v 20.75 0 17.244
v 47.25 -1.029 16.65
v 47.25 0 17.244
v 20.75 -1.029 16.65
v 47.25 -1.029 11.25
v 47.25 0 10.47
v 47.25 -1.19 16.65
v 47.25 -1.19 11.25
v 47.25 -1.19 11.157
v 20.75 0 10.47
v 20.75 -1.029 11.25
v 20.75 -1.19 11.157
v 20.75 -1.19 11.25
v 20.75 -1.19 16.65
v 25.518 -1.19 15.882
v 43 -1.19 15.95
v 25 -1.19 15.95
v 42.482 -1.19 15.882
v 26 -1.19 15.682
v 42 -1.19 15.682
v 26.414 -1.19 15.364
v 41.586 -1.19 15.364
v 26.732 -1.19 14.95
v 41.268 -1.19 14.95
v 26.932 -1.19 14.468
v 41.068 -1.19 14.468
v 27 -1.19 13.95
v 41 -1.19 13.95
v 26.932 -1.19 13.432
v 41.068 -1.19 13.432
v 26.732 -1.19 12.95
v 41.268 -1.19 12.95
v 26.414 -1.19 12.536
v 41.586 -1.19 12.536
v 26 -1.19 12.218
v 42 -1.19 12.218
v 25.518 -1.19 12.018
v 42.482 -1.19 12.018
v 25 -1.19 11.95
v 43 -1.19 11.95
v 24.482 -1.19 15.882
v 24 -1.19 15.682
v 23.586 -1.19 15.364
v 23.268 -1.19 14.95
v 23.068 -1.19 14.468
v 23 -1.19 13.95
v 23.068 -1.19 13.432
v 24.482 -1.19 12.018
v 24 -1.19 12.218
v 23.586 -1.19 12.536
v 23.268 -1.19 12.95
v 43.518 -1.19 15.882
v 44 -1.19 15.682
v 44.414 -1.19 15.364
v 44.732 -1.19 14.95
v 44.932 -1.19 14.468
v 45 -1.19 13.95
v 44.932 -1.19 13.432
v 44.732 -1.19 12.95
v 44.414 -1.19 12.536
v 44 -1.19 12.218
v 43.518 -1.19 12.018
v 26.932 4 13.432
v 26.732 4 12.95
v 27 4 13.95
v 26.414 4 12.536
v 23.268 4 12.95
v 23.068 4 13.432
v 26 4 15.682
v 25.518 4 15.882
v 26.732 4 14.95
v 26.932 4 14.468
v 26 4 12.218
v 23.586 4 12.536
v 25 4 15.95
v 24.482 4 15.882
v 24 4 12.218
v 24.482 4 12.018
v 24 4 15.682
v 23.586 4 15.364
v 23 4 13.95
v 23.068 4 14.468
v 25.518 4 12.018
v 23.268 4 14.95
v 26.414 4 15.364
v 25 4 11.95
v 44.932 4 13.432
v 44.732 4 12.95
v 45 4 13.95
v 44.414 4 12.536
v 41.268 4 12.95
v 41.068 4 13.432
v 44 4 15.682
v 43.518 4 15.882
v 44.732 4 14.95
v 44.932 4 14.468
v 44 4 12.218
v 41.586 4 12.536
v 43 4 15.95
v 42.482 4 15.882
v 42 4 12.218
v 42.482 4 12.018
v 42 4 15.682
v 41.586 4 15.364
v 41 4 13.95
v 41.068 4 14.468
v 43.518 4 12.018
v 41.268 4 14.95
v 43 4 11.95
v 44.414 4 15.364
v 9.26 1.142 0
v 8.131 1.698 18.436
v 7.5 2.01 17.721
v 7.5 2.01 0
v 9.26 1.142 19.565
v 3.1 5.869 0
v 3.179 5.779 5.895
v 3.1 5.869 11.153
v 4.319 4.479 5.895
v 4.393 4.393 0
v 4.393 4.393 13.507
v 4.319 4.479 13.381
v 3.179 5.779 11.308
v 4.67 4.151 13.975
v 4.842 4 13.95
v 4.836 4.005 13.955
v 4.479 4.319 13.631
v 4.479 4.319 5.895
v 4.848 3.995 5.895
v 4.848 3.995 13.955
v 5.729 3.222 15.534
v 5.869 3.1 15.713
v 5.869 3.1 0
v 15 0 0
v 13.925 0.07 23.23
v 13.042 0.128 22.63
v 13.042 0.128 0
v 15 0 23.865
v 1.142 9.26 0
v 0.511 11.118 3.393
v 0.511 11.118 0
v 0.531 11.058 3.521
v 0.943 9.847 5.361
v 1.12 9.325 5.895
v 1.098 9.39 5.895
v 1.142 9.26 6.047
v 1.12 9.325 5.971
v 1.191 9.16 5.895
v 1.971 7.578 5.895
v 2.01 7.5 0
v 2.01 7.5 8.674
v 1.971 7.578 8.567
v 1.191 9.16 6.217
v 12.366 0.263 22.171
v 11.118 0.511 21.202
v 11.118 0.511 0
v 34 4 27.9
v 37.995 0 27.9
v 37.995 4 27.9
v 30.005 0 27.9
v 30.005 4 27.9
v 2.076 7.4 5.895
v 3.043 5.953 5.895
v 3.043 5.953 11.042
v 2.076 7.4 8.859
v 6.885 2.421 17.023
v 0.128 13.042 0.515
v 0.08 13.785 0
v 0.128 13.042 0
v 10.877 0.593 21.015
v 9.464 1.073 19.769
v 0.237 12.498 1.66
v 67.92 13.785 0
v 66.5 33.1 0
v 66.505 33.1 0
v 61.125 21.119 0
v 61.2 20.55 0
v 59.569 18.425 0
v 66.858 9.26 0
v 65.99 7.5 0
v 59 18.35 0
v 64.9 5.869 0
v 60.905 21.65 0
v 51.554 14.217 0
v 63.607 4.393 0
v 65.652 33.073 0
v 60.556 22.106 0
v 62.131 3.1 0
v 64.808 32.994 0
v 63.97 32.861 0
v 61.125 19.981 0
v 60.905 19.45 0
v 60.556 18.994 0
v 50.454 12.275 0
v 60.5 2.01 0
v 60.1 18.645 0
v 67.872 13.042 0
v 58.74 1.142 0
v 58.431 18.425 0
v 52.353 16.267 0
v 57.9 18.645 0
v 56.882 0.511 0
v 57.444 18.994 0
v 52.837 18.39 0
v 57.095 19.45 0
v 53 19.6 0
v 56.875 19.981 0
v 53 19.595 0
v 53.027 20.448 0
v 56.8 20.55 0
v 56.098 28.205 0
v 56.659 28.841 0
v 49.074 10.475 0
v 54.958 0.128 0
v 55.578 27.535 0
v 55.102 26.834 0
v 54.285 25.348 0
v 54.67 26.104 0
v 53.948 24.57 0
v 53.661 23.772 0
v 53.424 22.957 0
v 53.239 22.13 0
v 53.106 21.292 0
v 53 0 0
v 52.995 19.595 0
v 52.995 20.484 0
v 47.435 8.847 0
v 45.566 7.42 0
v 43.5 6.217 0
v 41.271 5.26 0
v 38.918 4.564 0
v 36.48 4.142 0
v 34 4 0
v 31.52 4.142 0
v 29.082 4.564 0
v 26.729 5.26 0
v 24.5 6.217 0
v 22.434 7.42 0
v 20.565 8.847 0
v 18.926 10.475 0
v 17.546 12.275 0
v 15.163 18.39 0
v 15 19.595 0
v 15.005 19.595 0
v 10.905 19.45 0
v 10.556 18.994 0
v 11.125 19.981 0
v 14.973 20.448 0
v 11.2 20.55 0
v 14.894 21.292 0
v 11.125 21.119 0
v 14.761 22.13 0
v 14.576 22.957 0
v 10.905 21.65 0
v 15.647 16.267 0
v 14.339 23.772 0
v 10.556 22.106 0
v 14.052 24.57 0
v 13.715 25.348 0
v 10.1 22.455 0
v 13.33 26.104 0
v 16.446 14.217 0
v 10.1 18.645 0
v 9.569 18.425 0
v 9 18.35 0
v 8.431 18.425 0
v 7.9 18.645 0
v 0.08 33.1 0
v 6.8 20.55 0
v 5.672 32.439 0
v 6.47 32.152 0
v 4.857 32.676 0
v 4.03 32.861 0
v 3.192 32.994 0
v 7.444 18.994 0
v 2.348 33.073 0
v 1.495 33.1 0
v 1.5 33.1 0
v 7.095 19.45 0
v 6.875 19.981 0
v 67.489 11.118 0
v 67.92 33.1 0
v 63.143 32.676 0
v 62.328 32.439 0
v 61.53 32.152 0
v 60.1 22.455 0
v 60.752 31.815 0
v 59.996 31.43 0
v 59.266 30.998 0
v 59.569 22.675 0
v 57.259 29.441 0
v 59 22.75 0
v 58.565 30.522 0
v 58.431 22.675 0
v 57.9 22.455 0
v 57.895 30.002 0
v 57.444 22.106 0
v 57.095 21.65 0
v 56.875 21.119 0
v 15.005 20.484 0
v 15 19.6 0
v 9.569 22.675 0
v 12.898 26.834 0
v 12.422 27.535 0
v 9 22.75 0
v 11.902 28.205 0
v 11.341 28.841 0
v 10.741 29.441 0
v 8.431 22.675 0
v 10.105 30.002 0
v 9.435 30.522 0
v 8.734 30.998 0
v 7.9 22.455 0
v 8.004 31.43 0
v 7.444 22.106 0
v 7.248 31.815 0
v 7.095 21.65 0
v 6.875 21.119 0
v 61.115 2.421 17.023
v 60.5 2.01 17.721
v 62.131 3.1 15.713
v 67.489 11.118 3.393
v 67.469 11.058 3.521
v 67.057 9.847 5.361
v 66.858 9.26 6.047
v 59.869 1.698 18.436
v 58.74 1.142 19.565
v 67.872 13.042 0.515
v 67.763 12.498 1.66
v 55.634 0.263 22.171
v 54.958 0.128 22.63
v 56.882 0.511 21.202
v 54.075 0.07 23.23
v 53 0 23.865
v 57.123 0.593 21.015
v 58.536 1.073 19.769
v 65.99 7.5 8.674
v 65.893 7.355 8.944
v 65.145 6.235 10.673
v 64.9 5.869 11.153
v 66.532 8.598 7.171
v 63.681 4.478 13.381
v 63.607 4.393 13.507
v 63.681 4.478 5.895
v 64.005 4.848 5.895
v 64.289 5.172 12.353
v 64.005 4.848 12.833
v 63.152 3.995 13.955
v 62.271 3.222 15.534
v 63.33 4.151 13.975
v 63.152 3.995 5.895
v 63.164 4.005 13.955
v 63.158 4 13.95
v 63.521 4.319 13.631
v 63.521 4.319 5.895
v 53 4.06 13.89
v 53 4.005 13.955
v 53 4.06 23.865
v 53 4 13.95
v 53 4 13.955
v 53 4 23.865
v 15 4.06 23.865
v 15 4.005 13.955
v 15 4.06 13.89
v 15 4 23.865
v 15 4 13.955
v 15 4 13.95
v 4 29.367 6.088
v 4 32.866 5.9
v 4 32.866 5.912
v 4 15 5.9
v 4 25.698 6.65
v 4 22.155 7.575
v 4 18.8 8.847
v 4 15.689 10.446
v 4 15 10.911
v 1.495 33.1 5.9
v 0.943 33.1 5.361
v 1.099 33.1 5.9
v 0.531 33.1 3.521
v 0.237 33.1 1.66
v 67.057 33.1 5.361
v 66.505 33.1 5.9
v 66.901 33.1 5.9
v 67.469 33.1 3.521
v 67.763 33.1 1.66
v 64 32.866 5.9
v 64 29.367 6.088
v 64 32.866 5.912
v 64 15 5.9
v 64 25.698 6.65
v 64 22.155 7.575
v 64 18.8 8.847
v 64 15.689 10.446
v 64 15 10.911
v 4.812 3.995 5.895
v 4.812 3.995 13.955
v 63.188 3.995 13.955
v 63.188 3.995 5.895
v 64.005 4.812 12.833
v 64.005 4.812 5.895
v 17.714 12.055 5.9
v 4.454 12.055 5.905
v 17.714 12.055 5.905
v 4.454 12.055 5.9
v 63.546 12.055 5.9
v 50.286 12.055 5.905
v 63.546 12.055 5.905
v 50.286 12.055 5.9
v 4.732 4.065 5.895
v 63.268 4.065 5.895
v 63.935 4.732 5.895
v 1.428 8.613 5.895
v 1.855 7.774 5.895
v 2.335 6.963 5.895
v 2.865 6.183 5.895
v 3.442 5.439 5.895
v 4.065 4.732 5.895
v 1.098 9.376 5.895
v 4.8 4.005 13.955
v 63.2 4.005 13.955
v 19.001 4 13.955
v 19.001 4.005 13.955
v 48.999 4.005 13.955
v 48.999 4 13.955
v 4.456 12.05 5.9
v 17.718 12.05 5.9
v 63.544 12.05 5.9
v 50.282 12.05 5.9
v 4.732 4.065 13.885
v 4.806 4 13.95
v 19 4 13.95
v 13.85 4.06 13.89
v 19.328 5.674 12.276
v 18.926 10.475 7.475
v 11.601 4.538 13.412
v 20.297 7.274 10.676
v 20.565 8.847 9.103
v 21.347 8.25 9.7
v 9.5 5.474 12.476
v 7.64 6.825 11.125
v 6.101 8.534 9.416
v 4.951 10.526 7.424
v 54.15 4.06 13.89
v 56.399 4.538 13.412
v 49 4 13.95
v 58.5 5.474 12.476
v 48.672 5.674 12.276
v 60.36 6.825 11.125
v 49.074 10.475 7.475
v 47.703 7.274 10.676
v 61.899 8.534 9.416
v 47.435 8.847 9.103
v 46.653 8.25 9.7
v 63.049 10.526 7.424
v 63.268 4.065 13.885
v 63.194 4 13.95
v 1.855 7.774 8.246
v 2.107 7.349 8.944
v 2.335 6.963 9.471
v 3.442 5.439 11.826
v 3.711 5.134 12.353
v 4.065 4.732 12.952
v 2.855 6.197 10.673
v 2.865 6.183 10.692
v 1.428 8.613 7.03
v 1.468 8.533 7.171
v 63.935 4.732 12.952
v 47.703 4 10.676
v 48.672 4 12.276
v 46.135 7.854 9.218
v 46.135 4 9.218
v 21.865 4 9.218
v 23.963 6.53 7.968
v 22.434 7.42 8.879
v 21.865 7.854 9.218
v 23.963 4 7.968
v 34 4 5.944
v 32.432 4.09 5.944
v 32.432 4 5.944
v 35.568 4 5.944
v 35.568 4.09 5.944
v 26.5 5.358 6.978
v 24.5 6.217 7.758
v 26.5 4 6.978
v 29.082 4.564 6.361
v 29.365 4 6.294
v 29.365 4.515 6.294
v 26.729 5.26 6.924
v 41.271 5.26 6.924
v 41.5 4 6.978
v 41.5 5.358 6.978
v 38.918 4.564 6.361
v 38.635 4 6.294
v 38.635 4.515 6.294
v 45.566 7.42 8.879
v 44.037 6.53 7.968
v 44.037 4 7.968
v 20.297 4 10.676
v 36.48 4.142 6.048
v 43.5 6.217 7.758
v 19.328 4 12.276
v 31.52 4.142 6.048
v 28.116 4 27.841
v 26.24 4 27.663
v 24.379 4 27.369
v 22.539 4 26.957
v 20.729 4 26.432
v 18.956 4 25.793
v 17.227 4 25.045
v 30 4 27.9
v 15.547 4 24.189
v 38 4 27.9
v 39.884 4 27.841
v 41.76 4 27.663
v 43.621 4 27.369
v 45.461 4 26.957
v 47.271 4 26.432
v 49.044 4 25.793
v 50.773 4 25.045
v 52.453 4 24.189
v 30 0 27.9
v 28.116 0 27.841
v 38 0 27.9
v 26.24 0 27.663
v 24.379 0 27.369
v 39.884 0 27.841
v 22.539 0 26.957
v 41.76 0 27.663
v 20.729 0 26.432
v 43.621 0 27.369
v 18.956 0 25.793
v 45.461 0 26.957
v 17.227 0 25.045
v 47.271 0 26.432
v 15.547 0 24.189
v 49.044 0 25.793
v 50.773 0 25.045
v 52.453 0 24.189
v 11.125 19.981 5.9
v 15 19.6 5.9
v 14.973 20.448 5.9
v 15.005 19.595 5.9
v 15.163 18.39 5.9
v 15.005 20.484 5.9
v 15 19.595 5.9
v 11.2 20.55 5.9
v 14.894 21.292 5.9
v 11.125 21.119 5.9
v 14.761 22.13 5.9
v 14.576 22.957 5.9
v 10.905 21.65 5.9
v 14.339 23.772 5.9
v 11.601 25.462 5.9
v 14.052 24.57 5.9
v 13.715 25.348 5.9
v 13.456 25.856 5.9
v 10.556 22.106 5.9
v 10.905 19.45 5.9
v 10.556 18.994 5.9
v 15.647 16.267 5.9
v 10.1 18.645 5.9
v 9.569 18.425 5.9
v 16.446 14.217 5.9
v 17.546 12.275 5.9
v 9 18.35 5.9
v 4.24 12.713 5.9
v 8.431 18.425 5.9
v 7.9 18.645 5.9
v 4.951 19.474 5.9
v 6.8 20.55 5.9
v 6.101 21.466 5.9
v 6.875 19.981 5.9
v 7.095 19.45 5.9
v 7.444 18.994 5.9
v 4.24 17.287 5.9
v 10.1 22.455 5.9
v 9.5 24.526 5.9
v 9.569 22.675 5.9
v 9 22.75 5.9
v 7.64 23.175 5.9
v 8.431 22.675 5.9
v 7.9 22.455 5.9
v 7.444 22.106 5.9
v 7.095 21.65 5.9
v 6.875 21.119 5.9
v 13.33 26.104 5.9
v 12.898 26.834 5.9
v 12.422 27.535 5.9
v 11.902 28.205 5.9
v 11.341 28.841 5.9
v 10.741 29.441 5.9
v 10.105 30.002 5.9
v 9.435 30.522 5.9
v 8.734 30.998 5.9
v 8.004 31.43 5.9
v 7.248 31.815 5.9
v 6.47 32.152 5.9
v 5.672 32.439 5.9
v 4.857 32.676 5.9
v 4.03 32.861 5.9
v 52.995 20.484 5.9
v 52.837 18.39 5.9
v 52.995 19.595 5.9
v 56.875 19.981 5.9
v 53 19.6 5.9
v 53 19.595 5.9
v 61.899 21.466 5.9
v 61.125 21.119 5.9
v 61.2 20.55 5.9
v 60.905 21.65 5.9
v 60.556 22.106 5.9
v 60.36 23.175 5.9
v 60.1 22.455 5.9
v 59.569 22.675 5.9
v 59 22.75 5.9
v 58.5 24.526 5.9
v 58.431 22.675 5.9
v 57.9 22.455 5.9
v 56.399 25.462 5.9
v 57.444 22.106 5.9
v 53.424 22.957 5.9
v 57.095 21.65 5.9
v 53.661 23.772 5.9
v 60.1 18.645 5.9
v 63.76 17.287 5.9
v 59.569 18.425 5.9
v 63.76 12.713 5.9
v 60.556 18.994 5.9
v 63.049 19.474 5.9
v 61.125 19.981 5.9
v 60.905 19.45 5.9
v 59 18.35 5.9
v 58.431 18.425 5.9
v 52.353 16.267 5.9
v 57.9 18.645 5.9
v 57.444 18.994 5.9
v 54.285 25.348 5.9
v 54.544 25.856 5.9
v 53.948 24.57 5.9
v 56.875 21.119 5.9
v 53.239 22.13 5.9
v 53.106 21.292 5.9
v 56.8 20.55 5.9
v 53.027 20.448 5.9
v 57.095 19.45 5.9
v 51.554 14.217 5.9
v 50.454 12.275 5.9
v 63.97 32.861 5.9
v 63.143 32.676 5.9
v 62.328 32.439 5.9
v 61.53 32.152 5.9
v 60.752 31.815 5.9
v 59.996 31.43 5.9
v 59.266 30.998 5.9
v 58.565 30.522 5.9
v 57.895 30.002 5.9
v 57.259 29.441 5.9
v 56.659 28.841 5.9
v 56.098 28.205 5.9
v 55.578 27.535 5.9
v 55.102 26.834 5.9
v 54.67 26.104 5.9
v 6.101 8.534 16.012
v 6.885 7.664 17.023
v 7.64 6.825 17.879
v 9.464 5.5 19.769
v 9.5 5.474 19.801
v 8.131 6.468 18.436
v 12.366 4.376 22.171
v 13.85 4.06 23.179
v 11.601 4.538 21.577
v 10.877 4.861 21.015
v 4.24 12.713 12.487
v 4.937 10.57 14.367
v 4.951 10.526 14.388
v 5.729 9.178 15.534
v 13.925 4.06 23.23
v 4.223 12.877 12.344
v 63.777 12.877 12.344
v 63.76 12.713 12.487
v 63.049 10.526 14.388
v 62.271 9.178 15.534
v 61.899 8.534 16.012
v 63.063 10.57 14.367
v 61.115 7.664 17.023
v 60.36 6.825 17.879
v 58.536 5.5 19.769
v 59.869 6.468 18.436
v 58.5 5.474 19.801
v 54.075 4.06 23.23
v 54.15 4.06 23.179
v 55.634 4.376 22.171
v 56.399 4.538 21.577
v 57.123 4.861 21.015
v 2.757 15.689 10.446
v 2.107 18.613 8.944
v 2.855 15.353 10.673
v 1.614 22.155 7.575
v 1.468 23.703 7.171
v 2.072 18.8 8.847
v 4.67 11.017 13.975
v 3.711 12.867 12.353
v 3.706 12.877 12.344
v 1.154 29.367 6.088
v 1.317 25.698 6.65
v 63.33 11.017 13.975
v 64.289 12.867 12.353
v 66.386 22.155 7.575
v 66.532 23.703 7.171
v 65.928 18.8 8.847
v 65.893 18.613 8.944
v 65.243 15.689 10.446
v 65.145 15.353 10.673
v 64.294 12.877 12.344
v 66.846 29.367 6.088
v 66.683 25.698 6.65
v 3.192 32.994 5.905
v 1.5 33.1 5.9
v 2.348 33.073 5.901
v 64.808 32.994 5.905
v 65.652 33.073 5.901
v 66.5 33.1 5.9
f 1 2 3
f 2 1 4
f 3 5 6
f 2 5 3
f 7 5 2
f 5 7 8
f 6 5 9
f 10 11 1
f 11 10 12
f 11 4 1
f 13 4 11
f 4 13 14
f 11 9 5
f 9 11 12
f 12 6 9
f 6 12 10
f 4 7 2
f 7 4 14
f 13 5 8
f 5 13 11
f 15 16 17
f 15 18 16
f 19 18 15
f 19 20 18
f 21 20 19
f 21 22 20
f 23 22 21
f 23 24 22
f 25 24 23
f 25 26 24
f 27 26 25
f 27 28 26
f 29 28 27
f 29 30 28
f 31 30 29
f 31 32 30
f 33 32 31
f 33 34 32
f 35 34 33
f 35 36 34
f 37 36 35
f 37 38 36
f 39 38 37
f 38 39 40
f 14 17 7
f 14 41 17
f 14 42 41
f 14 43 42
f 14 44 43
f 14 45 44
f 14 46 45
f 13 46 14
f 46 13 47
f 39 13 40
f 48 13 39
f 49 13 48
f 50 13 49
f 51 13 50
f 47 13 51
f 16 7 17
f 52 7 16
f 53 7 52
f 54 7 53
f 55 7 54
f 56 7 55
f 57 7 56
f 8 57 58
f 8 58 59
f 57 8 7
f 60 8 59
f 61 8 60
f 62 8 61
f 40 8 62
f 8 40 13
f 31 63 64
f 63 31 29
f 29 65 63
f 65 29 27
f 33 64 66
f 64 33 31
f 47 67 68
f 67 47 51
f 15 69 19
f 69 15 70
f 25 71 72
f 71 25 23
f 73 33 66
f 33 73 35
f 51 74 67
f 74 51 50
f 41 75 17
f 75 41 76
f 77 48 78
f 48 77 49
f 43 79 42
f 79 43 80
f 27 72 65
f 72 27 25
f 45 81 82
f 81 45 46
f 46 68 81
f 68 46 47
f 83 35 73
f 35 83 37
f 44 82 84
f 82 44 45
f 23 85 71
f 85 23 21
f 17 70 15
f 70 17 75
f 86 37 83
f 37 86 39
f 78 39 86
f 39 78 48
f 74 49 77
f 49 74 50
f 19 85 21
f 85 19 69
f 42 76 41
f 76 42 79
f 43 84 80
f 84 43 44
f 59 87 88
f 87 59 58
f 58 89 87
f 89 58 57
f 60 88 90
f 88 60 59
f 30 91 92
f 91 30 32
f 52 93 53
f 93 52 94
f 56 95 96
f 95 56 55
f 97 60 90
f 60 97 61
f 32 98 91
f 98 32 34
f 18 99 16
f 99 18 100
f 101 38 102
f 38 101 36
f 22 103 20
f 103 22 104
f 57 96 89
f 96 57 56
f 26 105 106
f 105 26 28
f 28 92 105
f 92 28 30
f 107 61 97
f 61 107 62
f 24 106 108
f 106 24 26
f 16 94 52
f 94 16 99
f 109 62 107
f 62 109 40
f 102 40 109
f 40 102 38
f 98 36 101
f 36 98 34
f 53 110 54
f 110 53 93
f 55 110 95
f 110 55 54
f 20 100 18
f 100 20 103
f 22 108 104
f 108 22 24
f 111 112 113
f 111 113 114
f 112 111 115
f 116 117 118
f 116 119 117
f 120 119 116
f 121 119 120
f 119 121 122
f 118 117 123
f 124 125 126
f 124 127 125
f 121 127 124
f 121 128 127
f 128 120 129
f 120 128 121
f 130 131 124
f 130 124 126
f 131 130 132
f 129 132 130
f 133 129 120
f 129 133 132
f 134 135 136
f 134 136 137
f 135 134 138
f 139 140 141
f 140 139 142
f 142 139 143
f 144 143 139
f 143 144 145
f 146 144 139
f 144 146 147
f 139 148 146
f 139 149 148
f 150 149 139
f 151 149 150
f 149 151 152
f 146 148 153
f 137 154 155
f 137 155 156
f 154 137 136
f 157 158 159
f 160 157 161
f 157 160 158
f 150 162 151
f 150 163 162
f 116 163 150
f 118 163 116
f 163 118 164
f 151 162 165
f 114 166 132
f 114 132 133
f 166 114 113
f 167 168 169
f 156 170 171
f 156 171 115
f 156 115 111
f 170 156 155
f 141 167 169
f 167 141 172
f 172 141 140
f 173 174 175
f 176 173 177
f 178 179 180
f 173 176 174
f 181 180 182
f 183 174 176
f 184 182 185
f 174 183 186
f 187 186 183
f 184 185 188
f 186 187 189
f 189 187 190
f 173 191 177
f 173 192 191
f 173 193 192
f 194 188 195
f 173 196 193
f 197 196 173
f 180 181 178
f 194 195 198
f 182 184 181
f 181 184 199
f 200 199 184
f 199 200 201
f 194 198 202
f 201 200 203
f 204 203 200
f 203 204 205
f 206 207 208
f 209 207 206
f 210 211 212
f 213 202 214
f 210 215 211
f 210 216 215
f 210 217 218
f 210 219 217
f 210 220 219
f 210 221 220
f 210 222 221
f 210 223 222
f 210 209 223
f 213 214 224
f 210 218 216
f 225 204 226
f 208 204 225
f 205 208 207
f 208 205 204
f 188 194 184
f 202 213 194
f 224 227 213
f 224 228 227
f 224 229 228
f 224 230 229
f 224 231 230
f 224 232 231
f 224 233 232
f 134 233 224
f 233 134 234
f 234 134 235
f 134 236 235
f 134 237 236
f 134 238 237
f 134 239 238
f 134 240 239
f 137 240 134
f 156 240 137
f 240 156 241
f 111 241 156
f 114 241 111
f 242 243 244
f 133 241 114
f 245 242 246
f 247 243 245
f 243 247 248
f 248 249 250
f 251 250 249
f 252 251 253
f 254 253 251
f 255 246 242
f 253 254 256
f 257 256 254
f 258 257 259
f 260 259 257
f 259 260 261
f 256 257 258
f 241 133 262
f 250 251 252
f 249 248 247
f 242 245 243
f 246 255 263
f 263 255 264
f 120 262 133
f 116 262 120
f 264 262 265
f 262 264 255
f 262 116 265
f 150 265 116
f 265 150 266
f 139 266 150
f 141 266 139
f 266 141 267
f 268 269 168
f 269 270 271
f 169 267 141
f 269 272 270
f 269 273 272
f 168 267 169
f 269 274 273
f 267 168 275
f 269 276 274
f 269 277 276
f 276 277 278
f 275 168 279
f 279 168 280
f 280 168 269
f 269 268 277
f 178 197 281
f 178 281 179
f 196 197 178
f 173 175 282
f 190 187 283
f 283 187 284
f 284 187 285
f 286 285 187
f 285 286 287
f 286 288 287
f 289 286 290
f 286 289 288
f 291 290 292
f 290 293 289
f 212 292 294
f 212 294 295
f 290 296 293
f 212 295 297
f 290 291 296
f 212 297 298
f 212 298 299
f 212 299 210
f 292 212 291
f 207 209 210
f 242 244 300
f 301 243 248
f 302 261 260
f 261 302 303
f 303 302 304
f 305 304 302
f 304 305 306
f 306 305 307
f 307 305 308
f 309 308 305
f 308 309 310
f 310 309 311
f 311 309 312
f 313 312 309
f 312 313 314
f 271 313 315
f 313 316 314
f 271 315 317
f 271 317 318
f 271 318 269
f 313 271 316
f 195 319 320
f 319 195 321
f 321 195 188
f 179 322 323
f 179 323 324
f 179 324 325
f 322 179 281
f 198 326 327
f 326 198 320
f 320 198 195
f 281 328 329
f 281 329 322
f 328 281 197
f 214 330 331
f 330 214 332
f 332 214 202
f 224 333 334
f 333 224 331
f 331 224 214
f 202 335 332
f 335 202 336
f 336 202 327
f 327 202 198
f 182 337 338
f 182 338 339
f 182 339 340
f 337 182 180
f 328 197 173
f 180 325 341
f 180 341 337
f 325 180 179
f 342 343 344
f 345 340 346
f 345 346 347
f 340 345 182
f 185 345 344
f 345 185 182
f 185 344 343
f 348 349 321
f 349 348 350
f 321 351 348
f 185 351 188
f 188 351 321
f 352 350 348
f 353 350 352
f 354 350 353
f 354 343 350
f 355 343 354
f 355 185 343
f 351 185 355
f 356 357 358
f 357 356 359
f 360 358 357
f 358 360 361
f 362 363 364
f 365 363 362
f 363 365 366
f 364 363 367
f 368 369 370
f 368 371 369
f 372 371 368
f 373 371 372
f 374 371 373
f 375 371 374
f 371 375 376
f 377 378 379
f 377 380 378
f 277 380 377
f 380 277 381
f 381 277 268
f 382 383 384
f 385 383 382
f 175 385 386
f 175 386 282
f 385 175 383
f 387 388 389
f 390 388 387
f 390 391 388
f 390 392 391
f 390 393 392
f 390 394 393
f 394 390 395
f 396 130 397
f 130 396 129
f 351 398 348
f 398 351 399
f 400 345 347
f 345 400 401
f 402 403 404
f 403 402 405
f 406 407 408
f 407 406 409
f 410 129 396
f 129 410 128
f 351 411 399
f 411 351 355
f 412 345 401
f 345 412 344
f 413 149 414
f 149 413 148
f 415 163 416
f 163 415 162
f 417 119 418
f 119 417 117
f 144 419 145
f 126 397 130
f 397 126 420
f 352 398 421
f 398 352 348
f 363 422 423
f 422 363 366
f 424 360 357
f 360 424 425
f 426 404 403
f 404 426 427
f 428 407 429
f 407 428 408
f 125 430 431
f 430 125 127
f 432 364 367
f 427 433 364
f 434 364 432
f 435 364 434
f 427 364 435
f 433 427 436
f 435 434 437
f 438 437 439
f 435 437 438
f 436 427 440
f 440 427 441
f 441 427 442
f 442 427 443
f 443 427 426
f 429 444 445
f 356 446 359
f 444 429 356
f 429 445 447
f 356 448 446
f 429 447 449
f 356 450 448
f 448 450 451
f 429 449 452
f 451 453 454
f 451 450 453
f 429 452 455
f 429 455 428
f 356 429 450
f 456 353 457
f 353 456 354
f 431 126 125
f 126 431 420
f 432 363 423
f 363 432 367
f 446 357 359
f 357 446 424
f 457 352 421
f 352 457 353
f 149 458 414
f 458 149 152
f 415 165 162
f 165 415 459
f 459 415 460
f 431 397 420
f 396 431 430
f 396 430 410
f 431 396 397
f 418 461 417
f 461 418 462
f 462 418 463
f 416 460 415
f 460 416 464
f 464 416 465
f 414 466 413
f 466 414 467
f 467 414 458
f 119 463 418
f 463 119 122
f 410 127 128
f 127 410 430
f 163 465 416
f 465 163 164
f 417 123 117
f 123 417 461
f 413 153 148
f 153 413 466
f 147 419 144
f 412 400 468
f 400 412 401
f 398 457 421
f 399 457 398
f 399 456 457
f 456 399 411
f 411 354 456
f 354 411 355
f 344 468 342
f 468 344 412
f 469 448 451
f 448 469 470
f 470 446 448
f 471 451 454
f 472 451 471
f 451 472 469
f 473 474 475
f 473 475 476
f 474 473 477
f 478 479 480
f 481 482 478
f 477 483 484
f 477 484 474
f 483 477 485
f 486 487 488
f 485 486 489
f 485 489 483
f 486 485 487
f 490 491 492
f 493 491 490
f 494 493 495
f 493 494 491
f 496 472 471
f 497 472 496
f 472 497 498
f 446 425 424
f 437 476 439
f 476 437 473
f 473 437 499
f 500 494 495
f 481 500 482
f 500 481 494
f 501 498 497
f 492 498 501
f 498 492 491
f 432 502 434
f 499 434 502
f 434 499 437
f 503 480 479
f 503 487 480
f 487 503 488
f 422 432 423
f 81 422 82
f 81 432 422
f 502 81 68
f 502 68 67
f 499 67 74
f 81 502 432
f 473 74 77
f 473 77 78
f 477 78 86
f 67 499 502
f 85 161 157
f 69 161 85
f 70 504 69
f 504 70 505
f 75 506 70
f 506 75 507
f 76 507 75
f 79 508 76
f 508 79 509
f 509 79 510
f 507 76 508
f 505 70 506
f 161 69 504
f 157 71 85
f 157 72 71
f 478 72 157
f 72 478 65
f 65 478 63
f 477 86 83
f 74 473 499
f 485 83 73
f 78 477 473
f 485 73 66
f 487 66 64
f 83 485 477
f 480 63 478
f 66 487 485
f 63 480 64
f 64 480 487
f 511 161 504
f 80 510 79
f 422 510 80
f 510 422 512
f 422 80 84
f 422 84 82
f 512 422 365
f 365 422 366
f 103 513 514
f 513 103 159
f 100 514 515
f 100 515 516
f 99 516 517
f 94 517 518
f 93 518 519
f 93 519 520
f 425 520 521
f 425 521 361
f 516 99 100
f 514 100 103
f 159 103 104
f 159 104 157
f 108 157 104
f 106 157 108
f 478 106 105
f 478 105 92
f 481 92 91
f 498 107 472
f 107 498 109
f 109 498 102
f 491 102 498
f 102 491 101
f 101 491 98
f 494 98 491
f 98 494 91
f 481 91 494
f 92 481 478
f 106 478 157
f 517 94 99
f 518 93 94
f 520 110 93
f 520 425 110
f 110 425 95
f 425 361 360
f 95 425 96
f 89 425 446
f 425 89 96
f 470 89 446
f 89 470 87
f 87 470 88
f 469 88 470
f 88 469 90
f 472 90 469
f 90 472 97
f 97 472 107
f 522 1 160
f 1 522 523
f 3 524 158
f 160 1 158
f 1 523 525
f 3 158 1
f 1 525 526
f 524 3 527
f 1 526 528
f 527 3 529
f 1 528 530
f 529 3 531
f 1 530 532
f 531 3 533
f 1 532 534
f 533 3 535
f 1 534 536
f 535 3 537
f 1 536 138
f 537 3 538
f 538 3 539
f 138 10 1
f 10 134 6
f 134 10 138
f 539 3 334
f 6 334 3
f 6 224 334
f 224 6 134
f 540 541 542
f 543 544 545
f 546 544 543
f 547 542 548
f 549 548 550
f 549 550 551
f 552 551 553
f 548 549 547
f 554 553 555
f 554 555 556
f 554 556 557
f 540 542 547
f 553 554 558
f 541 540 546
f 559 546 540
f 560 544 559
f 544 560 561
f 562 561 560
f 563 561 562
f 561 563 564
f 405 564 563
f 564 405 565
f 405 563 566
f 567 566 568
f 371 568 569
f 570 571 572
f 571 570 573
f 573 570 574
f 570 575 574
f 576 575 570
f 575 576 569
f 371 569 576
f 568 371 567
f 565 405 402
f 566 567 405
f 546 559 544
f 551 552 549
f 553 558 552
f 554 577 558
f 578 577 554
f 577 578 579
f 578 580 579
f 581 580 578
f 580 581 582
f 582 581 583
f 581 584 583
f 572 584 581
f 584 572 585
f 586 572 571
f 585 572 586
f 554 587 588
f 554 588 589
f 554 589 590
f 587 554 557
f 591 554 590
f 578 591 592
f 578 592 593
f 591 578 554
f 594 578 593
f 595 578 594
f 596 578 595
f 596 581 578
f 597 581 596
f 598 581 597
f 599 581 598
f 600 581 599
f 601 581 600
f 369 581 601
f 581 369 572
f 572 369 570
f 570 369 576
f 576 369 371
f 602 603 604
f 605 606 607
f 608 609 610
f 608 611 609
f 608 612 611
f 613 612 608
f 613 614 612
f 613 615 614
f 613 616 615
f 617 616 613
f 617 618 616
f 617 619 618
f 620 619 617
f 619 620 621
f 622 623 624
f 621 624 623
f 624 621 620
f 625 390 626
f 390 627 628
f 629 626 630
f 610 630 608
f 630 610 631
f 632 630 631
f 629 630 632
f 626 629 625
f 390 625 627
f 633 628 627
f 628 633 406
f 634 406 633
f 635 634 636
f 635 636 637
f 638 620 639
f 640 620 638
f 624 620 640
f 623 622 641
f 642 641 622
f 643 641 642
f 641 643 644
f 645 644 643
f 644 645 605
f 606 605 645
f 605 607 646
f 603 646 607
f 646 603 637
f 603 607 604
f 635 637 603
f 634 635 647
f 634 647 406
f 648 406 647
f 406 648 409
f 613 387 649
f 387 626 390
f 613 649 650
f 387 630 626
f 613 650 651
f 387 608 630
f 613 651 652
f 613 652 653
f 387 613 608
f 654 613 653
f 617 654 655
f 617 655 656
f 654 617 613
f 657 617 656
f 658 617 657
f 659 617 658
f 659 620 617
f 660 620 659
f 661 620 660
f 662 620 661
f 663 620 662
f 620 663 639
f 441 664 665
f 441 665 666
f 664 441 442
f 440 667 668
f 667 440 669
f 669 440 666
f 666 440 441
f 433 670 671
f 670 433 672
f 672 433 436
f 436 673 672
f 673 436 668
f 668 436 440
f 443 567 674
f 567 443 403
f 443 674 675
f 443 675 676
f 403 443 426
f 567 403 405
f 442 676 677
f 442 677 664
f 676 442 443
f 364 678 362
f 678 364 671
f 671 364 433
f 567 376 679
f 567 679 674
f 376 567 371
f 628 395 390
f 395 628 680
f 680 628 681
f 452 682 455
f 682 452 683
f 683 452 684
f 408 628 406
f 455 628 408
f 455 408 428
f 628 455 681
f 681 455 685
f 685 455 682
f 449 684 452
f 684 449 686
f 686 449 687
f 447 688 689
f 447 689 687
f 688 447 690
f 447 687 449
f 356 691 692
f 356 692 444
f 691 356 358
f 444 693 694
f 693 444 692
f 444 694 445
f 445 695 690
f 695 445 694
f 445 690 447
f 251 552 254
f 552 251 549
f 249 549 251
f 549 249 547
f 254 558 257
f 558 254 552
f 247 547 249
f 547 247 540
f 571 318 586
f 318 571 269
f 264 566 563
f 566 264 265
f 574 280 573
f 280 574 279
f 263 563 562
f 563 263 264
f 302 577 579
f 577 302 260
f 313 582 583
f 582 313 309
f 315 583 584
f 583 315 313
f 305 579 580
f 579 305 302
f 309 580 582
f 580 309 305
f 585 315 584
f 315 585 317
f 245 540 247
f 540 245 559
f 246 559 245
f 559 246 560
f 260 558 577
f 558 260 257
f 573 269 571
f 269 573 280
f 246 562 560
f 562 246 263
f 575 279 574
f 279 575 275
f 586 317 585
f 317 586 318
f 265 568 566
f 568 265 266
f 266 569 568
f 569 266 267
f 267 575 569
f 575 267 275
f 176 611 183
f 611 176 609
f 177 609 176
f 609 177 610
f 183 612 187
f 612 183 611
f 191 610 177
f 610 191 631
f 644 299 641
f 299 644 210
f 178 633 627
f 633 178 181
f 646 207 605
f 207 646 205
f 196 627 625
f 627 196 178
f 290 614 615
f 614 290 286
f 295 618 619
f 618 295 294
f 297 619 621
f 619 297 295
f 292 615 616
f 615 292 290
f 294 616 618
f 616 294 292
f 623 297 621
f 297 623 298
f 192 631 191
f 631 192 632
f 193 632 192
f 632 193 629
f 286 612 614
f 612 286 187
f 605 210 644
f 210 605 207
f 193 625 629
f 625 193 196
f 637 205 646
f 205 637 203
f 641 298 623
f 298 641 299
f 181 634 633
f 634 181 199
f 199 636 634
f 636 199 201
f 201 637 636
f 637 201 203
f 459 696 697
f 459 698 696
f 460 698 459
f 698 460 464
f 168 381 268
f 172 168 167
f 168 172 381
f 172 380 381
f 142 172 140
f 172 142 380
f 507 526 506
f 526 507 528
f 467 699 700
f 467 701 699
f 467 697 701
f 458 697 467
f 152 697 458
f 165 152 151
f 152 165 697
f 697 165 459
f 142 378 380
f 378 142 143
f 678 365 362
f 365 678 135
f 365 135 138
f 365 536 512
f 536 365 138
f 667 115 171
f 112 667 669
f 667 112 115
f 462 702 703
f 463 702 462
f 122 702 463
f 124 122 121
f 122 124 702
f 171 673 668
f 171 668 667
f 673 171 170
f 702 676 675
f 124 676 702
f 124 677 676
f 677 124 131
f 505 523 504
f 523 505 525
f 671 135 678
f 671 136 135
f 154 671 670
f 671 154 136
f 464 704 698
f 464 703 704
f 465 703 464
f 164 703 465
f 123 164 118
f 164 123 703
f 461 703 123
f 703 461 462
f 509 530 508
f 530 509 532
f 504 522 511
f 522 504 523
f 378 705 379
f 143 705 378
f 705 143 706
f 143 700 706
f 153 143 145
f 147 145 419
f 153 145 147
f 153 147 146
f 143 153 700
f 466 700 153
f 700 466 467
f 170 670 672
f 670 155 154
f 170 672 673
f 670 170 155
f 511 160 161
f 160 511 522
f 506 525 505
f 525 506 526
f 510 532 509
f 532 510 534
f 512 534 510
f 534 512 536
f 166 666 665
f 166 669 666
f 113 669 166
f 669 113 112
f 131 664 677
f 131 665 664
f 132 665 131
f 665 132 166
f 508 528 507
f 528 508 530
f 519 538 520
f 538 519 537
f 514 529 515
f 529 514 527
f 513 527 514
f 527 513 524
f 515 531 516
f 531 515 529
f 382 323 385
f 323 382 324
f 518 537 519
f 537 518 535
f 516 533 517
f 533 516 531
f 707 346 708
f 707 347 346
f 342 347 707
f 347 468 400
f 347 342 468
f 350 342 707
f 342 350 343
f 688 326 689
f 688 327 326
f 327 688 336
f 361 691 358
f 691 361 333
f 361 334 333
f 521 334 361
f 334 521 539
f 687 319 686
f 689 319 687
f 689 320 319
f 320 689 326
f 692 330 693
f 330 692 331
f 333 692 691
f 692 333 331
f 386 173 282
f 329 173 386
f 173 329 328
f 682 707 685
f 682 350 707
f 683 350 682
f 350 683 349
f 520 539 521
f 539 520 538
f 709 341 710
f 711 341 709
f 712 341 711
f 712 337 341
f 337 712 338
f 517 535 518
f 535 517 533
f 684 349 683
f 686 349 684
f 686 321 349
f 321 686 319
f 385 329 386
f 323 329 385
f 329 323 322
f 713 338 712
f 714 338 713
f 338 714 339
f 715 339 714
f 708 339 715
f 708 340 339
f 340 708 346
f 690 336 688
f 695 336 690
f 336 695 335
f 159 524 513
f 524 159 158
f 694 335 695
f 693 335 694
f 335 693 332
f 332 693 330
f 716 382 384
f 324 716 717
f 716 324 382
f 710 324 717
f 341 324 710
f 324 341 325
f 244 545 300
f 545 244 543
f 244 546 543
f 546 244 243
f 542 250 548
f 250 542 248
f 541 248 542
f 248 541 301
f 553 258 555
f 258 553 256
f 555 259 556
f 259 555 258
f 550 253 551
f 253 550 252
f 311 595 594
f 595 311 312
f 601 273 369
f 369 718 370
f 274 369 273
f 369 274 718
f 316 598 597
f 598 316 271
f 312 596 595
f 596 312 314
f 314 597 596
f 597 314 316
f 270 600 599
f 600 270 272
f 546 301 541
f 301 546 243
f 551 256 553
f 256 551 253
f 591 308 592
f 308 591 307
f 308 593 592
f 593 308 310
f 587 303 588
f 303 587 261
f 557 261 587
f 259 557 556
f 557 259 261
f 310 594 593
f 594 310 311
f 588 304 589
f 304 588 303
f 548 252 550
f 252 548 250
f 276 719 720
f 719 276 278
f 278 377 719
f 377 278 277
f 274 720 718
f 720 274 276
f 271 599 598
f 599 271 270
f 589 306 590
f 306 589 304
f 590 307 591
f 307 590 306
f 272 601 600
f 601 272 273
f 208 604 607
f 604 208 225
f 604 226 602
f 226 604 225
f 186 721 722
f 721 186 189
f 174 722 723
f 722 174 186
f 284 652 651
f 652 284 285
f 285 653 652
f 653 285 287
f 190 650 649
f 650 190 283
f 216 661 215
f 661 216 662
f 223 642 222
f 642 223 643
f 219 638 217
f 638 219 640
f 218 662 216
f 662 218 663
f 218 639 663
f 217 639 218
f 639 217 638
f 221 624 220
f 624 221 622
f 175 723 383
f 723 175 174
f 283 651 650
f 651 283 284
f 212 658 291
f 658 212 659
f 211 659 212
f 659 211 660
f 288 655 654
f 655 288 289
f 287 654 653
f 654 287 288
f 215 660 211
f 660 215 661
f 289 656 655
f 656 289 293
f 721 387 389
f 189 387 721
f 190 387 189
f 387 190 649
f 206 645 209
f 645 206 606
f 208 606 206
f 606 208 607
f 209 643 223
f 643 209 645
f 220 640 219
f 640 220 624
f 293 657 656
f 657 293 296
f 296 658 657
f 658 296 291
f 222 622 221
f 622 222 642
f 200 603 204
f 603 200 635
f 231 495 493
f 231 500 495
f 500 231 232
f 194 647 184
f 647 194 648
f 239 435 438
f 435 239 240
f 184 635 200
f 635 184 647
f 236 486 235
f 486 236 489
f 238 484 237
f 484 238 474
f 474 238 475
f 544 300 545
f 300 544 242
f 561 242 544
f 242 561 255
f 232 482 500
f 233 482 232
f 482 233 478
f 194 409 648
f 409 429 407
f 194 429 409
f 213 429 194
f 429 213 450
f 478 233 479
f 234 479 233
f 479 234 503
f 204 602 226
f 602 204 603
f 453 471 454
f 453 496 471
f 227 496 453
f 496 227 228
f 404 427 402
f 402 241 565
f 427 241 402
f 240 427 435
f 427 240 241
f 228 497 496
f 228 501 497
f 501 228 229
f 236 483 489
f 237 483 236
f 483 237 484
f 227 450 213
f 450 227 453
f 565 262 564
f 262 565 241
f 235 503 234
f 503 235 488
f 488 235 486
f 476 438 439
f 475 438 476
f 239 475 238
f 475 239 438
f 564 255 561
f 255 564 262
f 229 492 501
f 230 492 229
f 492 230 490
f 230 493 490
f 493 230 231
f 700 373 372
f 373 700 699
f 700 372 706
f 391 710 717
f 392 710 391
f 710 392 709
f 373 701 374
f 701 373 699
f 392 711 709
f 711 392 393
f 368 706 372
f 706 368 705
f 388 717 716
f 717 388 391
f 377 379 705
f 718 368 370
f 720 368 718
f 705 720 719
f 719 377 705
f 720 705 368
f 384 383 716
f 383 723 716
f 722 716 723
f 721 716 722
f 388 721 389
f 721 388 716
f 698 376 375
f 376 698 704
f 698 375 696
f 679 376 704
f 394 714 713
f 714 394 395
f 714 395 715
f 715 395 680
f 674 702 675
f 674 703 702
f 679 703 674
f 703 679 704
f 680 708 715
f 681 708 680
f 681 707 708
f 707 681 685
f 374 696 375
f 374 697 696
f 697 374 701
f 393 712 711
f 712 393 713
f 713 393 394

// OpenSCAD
// file: roundEdges.scad
/*
 *  Copyright (C) 2012  Krallinger Sebastian
 *
 *  This program is free software; you can redistribute it and/or modify
 *  it under the terms of the GNU General Public License as published by
 *  the Free Software Foundation; either version 3 of the License,
 *  LGPL version 2.1, or (at your option) any later version of the GPL.
 *
 *  This program is distributed in the hope that it will be useful,
 *  but WITHOUT ANY WARRANTY; without even the implied warranty of
 *  MERCHANTABILITY or FITNESS FOR A PARTICULAR PURPOSE.  See the
 *  GNU General Public License for more details.
 *
 *  You should have received a copy of the GNU General Public License
 *  along with this program; if not, write to the Free Software
 *  Foundation, Inc., 59 Temple Place, Suite 330, Boston, MA 02111-1307 USA
 *
*/


//Rounded Edges
module roundEdge(_a=0,_r=1,_l=1,_fn=100){
	rotate (a=[0,0,_a]){
		translate(v=[_r,_r,0]){
			rotate (a=[0,0,0]) rotate (a=[0,0,180]){
				difference() {
					translate (v=[-OS/2,-OS/2,-OS/2])
						cube (size = [_r+OS,_r+OS,_l+OS],center=false );
					translate (v=[0,0,-OS*2/2])
						cylinder (h = _l+OS*2, r=_r, center = false, $fn=_fn);
				}
			}
		}
	}
}
//roundEdge(_a=0,_l=10);
// file: teardrop.scad
module teardrop (r=4.5,h=20,top_and_bottom=false)
{
	rotate([-270,0,90])
	linear_extrude(height=h,convexity=10)
	{
		circle(r=r);
		polygon(points=[[0,0],[r*cos(30),r*sin(30)],[0.5*r,r],[-0.5*r,r],[-r*cos(30),r*sin(30)]],
				paths=[[0,1,2,3,4]]);
		if (top_and_bottom)
		polygon(points=[[0,0],[r*cos(30),-r*sin(30)],[0.5*r,-r],[-0.5*r,-r],[-r*cos(30),-r*sin(30)]],
				paths=[[0,1,2,3,4]]);
		
	}
}

module teardropcentering (r=4.5,h=20)
{
	rotate([-270,0,90])
	linear_extrude(height=h)
	{
		circle(r=r, $fn = 24);
		polygon(points=[[0,0],[r*cos(30),r*sin(30)],[0.5*r,1.2*r],[-0.5*r,1.2*r],[-r*cos(30),r*sin(30)]],
				paths=[[0,1,2,3,4]]);
	}
}

module teardropcentering2 (r=4.5,h=20)
{
	//rotate([-270,0,90])
	difference(){
	linear_extrude(height=h)
	{
		circle(r=r, $fn = 24);
		polygon(points=[[0,0],[r*cos(30),r*sin(30)],[0.5*r,1.2*r],[-0.5*r,1.2*r],[-r*cos(30),r*sin(30)]],
				paths=[[0,1,2,3,4]]);
	}
	translate(v = [-1.5*r, -1.5*r,-1])cube(size =[3*r,1.5*r,h+2]);
	}
}
// file: units.scad
/*
 * Basic units.
 * 
 * Originally by Hans Häggström, 2010.
 * Dual licenced under Creative Commons Attribution-Share Alike 3.0 and LGPL2 or later
 */


mm = 1;
cm = 10 * mm;
dm = 100 * mm;
m = 1000 * mm;

inch = 25.4 * mm;

X = [1, 0, 0];
Y = [0, 1, 0];
Z = [0, 0, 1];

M3 = 3*mm;
M4 = 4*mm;
M5 = 5*mm;
M6 = 6*mm;
M8 = 8*mm;


// When a small distance is needed to overlap shapes for boolean cutting, etc.
epsilon = 0.01*mm;
OS = epsilon;  // Over size
// main file
/* H-Xtruder-Mount [Xm]
 * Copyright (c) 2012 by Krallinger Sebastian [s.krallinger+cc@gmail.com]
 * 
 * Creative Commons Attribution-ShareAlike 3.0 (CC BY-SA) [http://creativecommons.org/licenses/by-sa/3.0/]
 * original desing by abdrumm for the PrintrBot
 */

include <units.scad>
include <teardrop.scad>
include <roundEdges.scad>


/*------------------------------------general---------------------------------*/
Xm_mode = "print";  // can be print or inspect [overlays the model with the original model] (uncomment next line)
Xm_mode = "inspect";

Xm_outline           = [68, 33.1, 27.9];   // absolute Xm_outline [x,y,z]


Xm_extM_tabelThickness = 5.9;

Xm_extM_genWallThickness = 4;

Xm_ext_hole_diam = 4.4;
Xm_ext_hole_xoff = 50/2;
Xm_ext_hole_yoff = 20.55;

Xm_Zdir_edge_r = 15;

Xm_carr_hole_zoff = Xm_outline[2]/2;
Xm_carr_hole_xoff = 18/2;
Xm_carr_hole_dia = 4;

Xm_tchOuterWidth     = 7.3;
Xm_notchInnerWidth   = 5.4;
Xm_notchDepth        = 1.2;
Xm_notchLength       = 24 + 2.5;



module H_Xtruder_mount() {
	ext_cutout_r = Xm_ext_hole_yoff- Xm_extM_genWallThickness;
	ext_cutout_scal = (Xm_ext_hole_xoff-Xm_extM_genWallThickness*1.5)/ext_cutout_r;
	extM_remainingPeeksXdir = (Xm_outline[0]-ext_cutout_r*ext_cutout_scal*2)/2;

	// notch
	difference() {
		union(){		
			translate([Xm_outline[0]/2, -Xm_notchDepth/2 + OS, Xm_carr_hole_zoff])
				cube(size=[Xm_notchLength, Xm_notchDepth, Xm_notchInnerWidth], center=true);
			
			for (i=[1,-1]) 
			translate([Xm_outline[0]/2,  + OS, Xm_carr_hole_zoff+i*Xm_notchInnerWidth/2+Xm_notchDepth/2])
			rotate(a=-30,v=X) rotate(a=90,v=Y) 
				triangle(l=Xm_notchDepth,h=Xm_notchLength);
		}
		union(){
			// carr holes
			for (i=[-1,1]) 
			translate([Xm_outline[0]/2+i*Xm_carr_hole_xoff, -OS- Xm_notchDepth, Xm_carr_hole_zoff])
			rotate(a=-90,v=X) 
				cylinder(r=Xm_carr_hole_dia/2, h=Xm_extM_genWallThickness+2*OS, center=false,$fn=24); 
		}
	}
	

                                                                                                                                                                                                                                                                                                                                                                                                                                                                                                                                                                                                                                                                                                                                                                                                                                                                                                                                                                                                                                                                                                                                                                                                                                                                                                                                                                                                                                                                                                                                                                                                                                                                                                                                                                                                                                                                                                                                                                                                                                                                                                                                                                                                                                                                                                                                                                                                                                                                                                                                                                                                                                                                                                                                                                                                                                                                                                                                                                                                                                                                                                                                                                                                                                                             
	intersection() {
		cube(size=Xm_outline, center=false);
		
		difference() {
			union(){
				// z dir edges
				difference() {
					for (i=[Xm_Zdir_edge_r,Xm_outline[0]-Xm_Zdir_edge_r]) 
					translate([i, Xm_Zdir_edge_r, 0]) 
						cylinder(r=Xm_Zdir_edge_r, h=Xm_outline[2], center=false, $fn = 48);
					translate([Xm_Zdir_edge_r, 0, 0]) 
						cube(size=[Xm_outline[0]-2*Xm_Zdir_edge_r, Xm_outline[1], Xm_outline[2]], center=false);
					translate([0, Xm_Zdir_edge_r, 0]) 
						cube(size=[Xm_outline[0], Xm_outline[1]- Xm_Zdir_edge_r, Xm_outline[2]], center=false);
				}
				
				// conact plate carriage
				translate([Xm_Zdir_edge_r, 0, 0]) 
					cube(size=[Xm_outline[0]-2*Xm_Zdir_edge_r, Xm_extM_genWallThickness, Xm_outline[2]], center=false);

				// contact plate extruder
				translate([Xm_Zdir_edge_r, 0, 0]) 
					cube(size=[Xm_outline[0]-2*Xm_Zdir_edge_r, Xm_outline[1], Xm_extM_tabelThickness], center=false);
				translate([0, Xm_Zdir_edge_r, 0]) 
					cube(size=[Xm_outline[0], Xm_outline[1]- Xm_Zdir_edge_r, Xm_extM_tabelThickness], center=false);

				// y dir support
				for (i=[0,1])
				translate([i*(Xm_outline[0]-Xm_extM_genWallThickness), Xm_Zdir_edge_r, 0]) 
					cube(size=[Xm_extM_genWallThickness, Xm_outline[1]-Xm_Zdir_edge_r, Xm_outline[2]], center=false);

				_xdirSupport();
				
			}
			union(){
				// z dir edges
				difference() {
					for (i=[Xm_Zdir_edge_r,Xm_outline[0]-Xm_Zdir_edge_r]) 
					translate([i, Xm_Zdir_edge_r, Xm_extM_tabelThickness]) 
						cylinder(r=Xm_Zdir_edge_r - Xm_extM_genWallThickness, h=Xm_outline[2], center=false);
					_xdirSupport();
				}

				// ext cutout
				translate([Xm_outline[0]/2, Xm_ext_hole_yoff, -OS]) 
				scale([ext_cutout_scal, 1, 1])
					cylinder(r=ext_cutout_r, h=Xm_outline[2]+2*OS, center=false,,$fn=48);
				translate([Xm_outline[0]/2, Xm_ext_hole_yoff+(Xm_outline[1]-Xm_ext_hole_yoff)/2 +OS, Xm_extM_tabelThickness/2-OS]) scale([ext_cutout_scal, 1, 1]) 
					cube(size=[ext_cutout_r*2, abs((Xm_outline[1]-Xm_ext_hole_yoff))+OS, Xm_extM_tabelThickness+2*OS], center=true);

				// ext holder holes
				for (i=[-Xm_ext_hole_xoff,Xm_ext_hole_xoff]) {
					translate([Xm_outline[0]/2, Xm_ext_hole_yoff, -OS]) 
					translate([i, 0, 0]) 
						cylinder(r=Xm_ext_hole_diam/2, h=Xm_extM_tabelThickness+2*OS, center=false,$fn=24);
				}

				// support cutout
				translate([-OS, Xm_outline[1], Xm_outline[2]]) 
				rotate(a=90,v=Y)
				scale([1, 1.3, 1]) 
					cylinder(r=Xm_outline[2]-Xm_extM_tabelThickness, h=Xm_outline[0]+2*OS, center=false,$fn=48);

				// support rounded edges
				translate([0, 0, Xm_outline[2]]) 
				rotate(a=-90,v=X) 
					roundEdge(_a=0,_r=Xm_Zdir_edge_r*2,_l=Xm_outline[1],_fn=100);

				translate([Xm_outline[0], 0, Xm_outline[2]]) 
				rotate(a=-90,v=X) 
					roundEdge(_a=90,_r=Xm_Zdir_edge_r*2,_l=Xm_outline[1],_fn=100);

				// hole peeks rounded edges
				translate([Xm_outline[0]/2 - (ext_cutout_r*ext_cutout_scal), Xm_outline[1], 0]) 
					roundEdge(_a=180,_r=extM_remainingPeeksXdir*0.9,_l=Xm_outline[1],_fn=100);
				translate([Xm_outline[0]/2 + (ext_cutout_r*ext_cutout_scal), Xm_outline[1], 0]) 
					roundEdge(_a=-90,_r=extM_remainingPeeksXdir*0.9,_l=Xm_outline[1],_fn=100);

				// carr holes
				for (i=[-1,1]) 
				translate([Xm_outline[0]/2+i*Xm_carr_hole_xoff, -OS, Xm_carr_hole_zoff])
				rotate(a=-90,v=X) 
					cylinder(r=Xm_carr_hole_dia/2, h=Xm_extM_genWallThickness+2*OS, center=false,$fn=24); 
				
			}
		}
		
	}	
}
module _xdirSupport() {
	zdirScale = (Xm_carr_hole_zoff- Xm_extM_tabelThickness)/(Xm_carr_hole_xoff+ Xm_carr_hole_dia*1.5);
	// reinfocment
	difference() {
		union(){
			translate([0, Xm_extM_genWallThickness, Xm_extM_tabelThickness]) 
			rotate(a=90,v=Y) 
				roundEdge(_a=90,_r=Xm_carr_hole_zoff- Xm_extM_tabelThickness,_l=Xm_outline[0]-Xm_extM_genWallThickness,_fn=4);
		}
		union(){
			roundEdge(_a=0,_r=Xm_Zdir_edge_r,_l=Xm_outline[2],_fn=100);
			translate([Xm_outline[0], 0, 0]) 
			roundEdge(_a=90,_r=Xm_Zdir_edge_r,_l=Xm_outline[2],_fn=100);
			
			translate([Xm_outline[0]/2, 0, Xm_carr_hole_zoff])
			scale([1, 1, zdirScale]) 
			rotate(a=-90,v=X) 
				cylinder(r=Xm_carr_hole_xoff+ Xm_carr_hole_dia*1.5, h=Xm_outline[1], center=false);
		}
	}
}

if (Xm_mode == "inspect") {
	H_Xtruder_mount();
}
module H_Xtruder_mount_print() {
	translate([-Xm_outline[1]/2, 0, 0]) 
	H_Xtruder_mount(isMotor=true);
}
if (Xm_mode == "print") 
	H_Xtruder_mount_print();



module triangle(l,h){
	translate(v=[2*l/3,0,0]) rotate (a=180, v=[0,0,1])
	cylinder(r=2*l/3,h=h,center=true,$fn=3);
}
